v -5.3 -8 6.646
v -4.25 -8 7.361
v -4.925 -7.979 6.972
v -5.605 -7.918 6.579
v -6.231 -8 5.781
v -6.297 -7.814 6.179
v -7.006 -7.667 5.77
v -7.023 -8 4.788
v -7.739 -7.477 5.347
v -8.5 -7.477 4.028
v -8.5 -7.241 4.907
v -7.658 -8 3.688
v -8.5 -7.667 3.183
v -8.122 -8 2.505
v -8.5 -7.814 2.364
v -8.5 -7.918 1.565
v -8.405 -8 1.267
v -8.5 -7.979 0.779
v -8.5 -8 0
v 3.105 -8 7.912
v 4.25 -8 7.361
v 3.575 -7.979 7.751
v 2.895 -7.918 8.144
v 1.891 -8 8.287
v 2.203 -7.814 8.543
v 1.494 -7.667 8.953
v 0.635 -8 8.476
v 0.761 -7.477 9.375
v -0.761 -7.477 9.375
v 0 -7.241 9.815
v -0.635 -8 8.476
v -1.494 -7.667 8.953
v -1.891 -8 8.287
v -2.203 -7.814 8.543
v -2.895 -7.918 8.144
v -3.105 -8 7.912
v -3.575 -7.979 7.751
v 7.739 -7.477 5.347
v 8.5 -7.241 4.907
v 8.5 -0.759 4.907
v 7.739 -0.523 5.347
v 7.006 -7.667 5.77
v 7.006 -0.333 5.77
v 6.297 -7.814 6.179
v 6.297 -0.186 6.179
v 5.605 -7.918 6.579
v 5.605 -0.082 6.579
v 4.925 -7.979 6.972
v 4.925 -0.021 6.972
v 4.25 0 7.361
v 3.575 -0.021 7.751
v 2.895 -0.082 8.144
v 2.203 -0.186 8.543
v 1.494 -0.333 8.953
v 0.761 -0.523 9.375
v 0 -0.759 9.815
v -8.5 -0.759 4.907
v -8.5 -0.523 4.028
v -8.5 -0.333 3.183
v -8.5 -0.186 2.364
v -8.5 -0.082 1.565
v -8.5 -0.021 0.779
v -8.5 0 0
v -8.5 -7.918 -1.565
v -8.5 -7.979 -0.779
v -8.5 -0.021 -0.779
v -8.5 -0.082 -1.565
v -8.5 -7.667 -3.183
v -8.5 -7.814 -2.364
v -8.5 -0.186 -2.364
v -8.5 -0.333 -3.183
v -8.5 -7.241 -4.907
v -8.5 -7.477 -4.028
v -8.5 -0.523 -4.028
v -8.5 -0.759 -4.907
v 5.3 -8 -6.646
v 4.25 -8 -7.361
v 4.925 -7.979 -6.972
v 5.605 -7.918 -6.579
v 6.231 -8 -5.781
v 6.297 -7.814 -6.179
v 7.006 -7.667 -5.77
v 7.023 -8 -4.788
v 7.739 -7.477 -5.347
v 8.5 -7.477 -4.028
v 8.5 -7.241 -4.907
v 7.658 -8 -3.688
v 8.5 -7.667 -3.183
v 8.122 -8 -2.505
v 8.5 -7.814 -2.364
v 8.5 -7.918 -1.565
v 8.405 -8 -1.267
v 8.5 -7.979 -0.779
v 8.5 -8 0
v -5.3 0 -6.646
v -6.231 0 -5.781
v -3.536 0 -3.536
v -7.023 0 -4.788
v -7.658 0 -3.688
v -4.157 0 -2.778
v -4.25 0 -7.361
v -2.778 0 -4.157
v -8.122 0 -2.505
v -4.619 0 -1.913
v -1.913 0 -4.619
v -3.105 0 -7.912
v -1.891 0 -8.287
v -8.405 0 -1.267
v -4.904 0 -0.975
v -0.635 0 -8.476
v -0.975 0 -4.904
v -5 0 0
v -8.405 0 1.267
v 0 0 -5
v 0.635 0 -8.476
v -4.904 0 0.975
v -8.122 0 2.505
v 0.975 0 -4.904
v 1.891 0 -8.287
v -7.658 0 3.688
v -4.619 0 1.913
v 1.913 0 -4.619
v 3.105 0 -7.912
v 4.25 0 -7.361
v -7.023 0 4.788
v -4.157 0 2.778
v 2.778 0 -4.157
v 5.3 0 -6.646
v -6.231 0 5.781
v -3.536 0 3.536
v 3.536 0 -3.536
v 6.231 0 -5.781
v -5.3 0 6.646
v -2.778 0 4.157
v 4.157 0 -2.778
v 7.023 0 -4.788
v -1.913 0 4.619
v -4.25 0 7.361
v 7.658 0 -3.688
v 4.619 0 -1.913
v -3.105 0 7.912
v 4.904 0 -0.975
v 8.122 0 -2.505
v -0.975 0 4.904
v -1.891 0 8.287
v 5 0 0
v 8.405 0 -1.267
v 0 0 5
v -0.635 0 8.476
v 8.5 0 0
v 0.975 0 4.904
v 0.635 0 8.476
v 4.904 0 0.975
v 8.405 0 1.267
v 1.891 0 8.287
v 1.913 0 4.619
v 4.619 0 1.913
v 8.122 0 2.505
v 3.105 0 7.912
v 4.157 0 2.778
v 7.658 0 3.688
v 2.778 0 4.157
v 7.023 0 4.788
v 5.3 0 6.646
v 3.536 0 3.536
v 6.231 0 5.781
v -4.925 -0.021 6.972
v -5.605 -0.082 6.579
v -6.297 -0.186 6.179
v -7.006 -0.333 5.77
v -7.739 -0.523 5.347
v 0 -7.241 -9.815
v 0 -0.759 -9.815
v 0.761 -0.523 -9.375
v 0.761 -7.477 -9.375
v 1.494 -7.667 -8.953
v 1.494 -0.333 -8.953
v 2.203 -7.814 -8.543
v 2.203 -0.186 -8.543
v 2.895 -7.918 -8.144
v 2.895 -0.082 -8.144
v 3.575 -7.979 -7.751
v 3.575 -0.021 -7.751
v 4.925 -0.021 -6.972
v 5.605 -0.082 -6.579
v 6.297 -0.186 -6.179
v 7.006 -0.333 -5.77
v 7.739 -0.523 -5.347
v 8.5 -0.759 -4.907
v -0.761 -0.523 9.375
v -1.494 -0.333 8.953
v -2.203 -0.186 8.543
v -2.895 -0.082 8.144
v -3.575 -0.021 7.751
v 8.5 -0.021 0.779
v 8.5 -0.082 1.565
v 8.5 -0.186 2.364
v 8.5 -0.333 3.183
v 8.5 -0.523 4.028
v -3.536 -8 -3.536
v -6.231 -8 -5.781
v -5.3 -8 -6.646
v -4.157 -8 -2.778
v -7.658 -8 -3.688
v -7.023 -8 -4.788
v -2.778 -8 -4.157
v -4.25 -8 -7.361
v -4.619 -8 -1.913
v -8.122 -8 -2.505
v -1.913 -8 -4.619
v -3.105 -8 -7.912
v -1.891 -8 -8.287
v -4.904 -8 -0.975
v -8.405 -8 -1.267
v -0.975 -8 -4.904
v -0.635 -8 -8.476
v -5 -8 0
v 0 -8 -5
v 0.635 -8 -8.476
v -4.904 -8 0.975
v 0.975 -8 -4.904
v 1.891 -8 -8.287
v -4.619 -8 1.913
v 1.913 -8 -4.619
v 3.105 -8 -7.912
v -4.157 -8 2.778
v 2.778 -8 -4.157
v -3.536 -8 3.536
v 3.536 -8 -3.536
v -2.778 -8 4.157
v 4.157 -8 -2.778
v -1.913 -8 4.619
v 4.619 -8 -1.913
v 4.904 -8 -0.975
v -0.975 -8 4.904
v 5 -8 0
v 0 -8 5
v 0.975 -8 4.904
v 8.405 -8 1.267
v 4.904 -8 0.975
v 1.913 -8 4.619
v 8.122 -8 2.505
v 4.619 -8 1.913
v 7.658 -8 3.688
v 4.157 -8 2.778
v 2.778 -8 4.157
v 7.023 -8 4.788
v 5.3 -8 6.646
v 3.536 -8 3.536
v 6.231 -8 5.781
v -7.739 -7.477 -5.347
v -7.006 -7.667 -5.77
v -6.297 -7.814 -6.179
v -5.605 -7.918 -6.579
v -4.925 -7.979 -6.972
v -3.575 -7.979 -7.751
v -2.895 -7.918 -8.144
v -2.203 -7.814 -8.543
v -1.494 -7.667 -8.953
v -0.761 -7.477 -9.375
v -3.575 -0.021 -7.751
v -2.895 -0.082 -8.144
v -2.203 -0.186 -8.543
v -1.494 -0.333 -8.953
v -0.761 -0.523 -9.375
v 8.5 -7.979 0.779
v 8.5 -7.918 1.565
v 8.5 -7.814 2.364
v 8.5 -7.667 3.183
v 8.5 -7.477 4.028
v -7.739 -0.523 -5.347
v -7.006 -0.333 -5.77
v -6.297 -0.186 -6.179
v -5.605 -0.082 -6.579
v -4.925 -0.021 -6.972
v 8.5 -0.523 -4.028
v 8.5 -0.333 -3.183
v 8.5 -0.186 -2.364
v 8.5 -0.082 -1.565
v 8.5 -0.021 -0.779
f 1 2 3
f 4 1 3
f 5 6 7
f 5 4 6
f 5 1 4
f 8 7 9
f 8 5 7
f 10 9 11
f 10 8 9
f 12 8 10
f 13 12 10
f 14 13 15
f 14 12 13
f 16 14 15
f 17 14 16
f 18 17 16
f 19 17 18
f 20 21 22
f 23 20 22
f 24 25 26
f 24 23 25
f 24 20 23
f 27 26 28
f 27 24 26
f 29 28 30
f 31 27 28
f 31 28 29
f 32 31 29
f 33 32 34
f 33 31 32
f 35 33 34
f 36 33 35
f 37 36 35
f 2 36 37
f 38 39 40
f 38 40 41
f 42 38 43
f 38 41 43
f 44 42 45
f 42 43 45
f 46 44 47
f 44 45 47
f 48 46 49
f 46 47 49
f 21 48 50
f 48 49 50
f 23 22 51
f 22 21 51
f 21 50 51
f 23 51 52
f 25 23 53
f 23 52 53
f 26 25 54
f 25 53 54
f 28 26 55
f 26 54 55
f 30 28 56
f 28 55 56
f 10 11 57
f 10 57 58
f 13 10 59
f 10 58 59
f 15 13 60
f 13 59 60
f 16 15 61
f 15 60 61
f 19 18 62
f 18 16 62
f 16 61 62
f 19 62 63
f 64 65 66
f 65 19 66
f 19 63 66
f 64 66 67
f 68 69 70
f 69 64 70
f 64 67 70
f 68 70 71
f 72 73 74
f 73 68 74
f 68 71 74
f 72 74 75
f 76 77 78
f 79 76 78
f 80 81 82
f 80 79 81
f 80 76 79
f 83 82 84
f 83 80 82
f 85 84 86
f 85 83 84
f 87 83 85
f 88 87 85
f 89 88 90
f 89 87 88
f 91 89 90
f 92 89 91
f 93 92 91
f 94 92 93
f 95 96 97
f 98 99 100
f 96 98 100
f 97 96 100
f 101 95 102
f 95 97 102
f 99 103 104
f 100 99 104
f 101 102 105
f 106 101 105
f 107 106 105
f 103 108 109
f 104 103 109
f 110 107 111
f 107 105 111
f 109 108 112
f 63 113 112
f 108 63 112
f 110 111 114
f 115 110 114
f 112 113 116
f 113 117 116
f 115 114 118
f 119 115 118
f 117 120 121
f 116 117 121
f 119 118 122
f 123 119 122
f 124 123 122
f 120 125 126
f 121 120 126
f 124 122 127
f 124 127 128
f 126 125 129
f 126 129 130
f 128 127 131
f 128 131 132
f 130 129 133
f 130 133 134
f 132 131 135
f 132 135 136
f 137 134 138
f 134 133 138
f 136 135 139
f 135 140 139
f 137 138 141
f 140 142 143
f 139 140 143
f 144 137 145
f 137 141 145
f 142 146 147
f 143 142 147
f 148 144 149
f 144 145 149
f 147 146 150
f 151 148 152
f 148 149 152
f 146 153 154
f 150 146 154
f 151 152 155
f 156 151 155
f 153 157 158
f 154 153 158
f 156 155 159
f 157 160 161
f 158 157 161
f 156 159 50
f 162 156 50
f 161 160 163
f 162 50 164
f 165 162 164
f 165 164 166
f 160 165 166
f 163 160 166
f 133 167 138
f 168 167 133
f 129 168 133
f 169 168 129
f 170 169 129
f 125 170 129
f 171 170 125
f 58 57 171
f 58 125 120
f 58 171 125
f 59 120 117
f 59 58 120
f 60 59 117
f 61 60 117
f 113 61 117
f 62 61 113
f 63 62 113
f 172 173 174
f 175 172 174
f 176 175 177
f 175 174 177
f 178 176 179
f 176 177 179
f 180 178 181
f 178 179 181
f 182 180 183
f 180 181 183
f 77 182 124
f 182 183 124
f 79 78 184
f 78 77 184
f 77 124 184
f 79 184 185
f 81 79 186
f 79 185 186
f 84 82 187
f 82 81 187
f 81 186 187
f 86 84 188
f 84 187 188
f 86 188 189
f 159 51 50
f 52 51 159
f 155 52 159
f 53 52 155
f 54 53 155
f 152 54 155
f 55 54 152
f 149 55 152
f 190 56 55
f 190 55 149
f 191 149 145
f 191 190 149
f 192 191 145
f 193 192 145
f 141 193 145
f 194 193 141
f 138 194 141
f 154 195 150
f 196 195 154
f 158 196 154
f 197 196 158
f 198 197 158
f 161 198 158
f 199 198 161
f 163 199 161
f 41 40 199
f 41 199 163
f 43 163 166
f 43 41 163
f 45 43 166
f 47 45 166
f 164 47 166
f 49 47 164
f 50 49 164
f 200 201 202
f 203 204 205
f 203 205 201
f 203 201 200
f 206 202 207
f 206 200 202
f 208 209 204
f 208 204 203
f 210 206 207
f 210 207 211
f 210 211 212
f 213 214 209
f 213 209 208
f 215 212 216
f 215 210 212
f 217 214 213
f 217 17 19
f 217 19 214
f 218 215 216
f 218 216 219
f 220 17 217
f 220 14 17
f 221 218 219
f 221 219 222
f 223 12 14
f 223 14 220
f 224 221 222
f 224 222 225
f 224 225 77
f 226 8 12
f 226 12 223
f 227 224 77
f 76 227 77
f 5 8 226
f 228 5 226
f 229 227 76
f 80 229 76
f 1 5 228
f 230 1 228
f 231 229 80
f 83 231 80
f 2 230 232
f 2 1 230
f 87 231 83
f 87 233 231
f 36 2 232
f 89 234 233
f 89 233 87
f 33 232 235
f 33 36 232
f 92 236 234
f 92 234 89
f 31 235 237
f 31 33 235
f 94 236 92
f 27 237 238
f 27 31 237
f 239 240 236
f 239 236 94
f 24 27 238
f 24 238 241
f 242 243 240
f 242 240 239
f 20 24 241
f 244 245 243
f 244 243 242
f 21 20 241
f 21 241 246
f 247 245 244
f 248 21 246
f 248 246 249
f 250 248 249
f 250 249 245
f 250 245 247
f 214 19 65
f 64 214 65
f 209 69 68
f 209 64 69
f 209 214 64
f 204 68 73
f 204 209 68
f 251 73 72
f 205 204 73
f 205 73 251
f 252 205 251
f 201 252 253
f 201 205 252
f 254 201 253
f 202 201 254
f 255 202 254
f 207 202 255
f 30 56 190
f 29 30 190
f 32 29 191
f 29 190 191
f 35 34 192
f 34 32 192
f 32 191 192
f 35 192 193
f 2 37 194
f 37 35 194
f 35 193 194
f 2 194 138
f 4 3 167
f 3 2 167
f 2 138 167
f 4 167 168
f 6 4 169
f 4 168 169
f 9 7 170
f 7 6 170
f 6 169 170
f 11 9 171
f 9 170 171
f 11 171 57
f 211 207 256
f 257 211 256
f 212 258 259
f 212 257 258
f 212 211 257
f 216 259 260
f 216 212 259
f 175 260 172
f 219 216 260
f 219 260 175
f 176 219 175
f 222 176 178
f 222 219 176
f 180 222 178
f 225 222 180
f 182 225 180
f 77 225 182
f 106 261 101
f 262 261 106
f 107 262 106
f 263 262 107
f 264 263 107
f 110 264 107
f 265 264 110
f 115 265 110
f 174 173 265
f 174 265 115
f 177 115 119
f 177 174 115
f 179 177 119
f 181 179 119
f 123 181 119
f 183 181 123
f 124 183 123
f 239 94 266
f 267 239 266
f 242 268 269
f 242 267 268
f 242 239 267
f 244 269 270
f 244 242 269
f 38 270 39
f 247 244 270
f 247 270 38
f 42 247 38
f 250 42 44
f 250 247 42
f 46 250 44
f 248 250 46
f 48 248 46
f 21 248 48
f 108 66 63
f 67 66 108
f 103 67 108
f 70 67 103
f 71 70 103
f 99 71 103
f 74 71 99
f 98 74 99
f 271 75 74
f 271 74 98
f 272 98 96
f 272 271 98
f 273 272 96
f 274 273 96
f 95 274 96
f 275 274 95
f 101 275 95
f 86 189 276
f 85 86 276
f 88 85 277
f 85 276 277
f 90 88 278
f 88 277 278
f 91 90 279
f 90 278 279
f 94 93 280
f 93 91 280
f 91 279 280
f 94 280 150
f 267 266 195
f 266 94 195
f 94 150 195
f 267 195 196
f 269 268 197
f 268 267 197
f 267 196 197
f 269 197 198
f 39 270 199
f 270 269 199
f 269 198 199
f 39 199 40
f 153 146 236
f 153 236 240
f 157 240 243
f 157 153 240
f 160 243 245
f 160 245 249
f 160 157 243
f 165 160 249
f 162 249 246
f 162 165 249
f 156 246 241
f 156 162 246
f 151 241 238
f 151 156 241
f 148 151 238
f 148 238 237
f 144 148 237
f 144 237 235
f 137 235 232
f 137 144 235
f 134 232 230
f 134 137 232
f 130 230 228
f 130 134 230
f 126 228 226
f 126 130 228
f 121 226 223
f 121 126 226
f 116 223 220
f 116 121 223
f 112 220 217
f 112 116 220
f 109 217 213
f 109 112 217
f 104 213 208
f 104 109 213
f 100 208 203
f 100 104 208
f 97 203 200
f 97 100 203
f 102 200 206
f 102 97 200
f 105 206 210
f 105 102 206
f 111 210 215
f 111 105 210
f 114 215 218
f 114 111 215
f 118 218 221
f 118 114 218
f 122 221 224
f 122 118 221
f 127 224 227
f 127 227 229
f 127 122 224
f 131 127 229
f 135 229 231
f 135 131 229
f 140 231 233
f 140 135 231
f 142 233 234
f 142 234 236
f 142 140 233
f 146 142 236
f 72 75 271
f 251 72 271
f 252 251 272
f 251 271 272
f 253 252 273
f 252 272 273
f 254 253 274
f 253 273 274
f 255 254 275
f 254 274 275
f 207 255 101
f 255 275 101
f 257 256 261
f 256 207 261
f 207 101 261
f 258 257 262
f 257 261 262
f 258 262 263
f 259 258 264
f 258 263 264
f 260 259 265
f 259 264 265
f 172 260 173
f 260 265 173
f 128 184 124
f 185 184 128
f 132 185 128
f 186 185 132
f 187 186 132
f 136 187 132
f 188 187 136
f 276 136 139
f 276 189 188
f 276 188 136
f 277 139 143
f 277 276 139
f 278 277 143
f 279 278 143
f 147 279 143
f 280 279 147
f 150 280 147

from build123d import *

# Parameters (mm, degrees)
F0_R     = 5
F1_DEPTH = 8


with BuildPart() as f1:
    # F0 (on Front) → F1 (new body)
    with BuildSketch(Plane.XZ):
        Polygon((8.5, -4.907477), (8.5, 4.907477), (0, 9.814955), (-8.5, 4.907477), (-8.5, -4.907477), (0, -9.814955), align=None)
        Circle(F0_R, mode=Mode.SUBTRACT)
    extrude(amount=F1_DEPTH)

    # F2 (on Top) → F3 (revolve, cut)
    with BuildSketch(Plane.XY):
        Polygon((11.583601, -1.780318), (11.583601, 0), (8.5, 0), align=None)
        Polygon((11.583601, -6.219682), (8.5, -8), (11.583601, -8), align=None)
    revolve(axis=Axis((0, -4, 0), (0, -1, 0)), mode=Mode.SUBTRACT)


solid = f1.part
